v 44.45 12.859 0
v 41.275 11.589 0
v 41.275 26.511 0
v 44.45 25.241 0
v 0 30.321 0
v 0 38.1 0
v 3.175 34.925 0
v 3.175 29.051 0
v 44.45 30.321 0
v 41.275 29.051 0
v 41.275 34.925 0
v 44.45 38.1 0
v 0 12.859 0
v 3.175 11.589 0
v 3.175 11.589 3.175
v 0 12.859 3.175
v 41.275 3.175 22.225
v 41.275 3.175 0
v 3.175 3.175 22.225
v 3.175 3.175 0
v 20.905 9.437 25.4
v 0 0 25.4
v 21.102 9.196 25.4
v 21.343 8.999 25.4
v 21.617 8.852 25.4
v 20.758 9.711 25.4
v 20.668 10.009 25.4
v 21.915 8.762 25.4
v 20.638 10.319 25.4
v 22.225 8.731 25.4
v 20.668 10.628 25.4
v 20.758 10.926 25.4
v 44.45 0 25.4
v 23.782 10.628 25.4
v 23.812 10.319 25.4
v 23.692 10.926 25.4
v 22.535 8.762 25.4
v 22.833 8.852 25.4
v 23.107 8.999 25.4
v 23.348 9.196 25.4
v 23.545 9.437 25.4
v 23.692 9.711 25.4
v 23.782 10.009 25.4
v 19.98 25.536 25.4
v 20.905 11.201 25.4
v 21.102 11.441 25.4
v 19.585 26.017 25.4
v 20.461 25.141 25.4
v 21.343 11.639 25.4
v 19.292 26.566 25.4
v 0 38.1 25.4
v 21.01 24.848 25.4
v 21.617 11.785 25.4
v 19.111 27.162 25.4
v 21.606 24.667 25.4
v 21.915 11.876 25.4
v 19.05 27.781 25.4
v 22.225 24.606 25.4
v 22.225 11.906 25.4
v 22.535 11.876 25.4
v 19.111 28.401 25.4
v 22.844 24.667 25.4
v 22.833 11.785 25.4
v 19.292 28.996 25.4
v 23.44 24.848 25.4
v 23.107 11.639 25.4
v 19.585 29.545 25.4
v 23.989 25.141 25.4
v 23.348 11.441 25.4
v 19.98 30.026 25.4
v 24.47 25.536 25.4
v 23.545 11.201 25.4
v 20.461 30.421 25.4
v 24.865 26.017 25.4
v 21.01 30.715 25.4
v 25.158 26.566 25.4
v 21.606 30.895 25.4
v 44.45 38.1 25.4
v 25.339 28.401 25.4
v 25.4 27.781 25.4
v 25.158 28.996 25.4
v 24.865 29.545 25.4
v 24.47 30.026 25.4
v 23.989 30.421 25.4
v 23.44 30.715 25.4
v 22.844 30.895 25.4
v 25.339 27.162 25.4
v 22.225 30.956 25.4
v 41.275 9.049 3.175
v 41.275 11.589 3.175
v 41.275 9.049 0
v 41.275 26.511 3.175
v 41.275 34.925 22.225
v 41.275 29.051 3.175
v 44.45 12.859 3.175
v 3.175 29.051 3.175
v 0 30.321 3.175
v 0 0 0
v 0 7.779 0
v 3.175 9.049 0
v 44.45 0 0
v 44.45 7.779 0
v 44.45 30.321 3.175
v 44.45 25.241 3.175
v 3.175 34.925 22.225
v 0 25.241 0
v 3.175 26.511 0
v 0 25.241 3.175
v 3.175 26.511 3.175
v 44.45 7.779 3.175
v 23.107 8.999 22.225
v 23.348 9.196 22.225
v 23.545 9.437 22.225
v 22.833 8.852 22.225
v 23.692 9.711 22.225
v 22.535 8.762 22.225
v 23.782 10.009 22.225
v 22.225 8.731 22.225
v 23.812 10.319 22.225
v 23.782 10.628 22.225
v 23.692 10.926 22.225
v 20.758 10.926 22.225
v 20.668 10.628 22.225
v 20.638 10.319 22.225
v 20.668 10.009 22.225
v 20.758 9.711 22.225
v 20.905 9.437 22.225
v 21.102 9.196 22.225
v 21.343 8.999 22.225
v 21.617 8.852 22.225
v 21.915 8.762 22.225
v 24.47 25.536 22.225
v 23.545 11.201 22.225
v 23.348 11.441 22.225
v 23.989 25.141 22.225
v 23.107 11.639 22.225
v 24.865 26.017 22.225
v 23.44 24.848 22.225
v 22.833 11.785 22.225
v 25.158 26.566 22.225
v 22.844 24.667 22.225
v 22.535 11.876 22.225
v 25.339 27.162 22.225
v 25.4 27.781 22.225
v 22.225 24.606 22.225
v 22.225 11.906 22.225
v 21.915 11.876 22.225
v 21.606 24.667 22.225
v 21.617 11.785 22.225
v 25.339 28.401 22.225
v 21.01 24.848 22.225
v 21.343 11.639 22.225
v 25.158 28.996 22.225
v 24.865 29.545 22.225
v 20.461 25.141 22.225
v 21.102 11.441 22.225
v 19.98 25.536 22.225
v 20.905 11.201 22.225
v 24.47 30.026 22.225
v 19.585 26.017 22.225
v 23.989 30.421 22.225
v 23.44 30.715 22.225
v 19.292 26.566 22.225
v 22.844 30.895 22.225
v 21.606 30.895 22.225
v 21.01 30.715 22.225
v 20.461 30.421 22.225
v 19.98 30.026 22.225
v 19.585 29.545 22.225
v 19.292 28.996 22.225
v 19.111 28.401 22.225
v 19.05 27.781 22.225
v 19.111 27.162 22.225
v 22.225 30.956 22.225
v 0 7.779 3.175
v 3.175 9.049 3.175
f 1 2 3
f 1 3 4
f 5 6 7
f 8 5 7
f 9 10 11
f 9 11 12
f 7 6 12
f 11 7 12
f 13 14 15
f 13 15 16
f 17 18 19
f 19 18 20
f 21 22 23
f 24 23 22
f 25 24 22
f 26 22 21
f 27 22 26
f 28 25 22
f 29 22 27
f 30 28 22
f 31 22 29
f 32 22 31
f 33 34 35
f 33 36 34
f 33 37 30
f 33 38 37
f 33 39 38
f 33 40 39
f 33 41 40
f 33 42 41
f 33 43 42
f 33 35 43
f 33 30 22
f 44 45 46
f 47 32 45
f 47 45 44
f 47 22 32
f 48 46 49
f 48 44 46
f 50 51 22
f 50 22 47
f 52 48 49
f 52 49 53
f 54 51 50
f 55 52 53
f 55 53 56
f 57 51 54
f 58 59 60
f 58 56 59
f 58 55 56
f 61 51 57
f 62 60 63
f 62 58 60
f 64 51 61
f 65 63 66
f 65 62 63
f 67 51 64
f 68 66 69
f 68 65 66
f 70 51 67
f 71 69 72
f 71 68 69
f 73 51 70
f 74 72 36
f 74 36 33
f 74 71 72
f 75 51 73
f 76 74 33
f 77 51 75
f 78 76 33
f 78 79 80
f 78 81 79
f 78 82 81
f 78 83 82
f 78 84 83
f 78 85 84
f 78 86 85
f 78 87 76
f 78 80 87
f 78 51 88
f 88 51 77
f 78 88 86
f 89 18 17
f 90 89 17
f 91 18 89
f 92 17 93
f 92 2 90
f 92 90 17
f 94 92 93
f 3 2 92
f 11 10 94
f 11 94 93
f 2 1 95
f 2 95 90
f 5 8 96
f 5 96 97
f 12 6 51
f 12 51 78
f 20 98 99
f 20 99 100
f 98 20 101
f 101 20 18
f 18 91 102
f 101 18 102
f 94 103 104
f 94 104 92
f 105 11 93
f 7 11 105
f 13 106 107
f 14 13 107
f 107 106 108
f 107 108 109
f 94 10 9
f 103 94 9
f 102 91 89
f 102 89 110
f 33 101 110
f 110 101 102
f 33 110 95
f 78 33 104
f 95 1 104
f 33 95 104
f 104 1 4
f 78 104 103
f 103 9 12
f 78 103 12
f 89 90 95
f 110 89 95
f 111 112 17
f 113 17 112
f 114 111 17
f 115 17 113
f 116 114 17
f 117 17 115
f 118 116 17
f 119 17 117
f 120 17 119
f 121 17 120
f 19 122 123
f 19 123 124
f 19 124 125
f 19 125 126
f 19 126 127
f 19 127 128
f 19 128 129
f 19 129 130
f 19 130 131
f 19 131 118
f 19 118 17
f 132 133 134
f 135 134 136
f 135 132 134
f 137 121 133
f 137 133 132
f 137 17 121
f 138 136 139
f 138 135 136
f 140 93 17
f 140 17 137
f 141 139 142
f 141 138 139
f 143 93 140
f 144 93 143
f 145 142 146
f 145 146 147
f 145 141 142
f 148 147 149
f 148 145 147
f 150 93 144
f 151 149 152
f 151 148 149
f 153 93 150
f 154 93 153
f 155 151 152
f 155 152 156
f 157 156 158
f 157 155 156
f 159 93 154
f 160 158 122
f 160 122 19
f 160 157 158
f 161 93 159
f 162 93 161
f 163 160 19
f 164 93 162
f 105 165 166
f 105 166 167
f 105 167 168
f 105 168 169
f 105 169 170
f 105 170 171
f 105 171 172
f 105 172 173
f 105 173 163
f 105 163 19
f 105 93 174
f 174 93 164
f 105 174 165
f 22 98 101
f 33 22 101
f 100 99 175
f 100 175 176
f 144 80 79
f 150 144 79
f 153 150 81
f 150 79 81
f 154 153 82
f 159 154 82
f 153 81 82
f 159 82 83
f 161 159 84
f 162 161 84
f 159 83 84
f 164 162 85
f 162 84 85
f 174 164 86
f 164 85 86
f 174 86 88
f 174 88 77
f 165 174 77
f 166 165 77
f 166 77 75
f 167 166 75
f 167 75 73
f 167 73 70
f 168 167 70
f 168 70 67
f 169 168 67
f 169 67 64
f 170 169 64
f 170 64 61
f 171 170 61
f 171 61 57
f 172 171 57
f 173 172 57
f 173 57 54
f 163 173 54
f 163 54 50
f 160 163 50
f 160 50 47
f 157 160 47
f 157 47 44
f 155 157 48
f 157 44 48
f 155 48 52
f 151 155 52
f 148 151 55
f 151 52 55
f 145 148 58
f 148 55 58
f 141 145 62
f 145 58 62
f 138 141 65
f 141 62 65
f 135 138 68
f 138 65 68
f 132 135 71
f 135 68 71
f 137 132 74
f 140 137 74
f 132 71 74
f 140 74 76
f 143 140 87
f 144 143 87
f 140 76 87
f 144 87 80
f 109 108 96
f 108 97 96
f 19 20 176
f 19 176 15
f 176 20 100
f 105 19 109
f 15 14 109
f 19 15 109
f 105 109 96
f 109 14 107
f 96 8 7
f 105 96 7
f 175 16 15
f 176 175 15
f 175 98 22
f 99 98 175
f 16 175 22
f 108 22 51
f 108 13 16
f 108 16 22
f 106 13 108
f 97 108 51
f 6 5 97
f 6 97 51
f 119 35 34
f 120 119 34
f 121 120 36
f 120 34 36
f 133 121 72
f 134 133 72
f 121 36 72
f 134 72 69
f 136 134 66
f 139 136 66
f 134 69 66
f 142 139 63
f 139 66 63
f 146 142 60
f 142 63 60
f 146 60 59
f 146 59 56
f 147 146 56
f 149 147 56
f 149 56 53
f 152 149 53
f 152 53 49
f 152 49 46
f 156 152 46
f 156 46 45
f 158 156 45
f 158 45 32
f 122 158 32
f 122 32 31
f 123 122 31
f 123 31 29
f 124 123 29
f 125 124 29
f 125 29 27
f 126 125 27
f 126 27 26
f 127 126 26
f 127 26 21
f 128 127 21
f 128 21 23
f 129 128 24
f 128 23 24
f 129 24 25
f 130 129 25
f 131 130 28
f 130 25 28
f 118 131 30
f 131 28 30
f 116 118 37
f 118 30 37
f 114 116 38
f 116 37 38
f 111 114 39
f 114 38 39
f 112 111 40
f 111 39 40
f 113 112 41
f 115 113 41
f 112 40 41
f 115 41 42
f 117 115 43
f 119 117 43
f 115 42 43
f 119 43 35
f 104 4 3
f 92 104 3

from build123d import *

# Parameters (mm, degrees)
SKETCH1_W           = 44.45
SKETCH1_H           = 38.1
BOSS_EXTRUDE1_DEPTH = 25.4
SKETCH2_W           = 38.1
SKETCH2_H           = 31.75
CUT_EXTRUDE1_DEPTH  = 22.225
SKETCH3_R           = 3.175
SKETCH3_R_2         = 1.5875
CUT_EXTRUDE2_DEPTH  = 22.225
CUT_EXTRUDE3_DEPTH  = 3.175


with BuildPart() as part:
    # Sketch1 → Boss-Extrude1 (new body)
    with BuildSketch(Plane.XY):
        with Locations((22.225, 19.05)):
            Rectangle(SKETCH1_W, SKETCH1_H)
    extrude(amount=BOSS_EXTRUDE1_DEPTH)

    # Sketch2 → Cut-Extrude1 (cut)
    with BuildSketch(Plane(origin=(0, 0, 0), x_dir=(-1, 0, 0), z_dir=(0, 0, -1))):
        with Locations((-22.225, 19.05)):
            Rectangle(SKETCH2_W, SKETCH2_H)
    extrude(amount=-CUT_EXTRUDE1_DEPTH, mode=Mode.SUBTRACT)

    # Sketch3 → Cut-Extrude2 (cut)
    with BuildSketch(Plane.XY.offset(25.4)):
        with Locations((22.225, 27.78125)):
            Circle(SKETCH3_R)
        with Locations((22.225, 10.31875)):
            Circle(SKETCH3_R_2)
    extrude(amount=-CUT_EXTRUDE2_DEPTH, mode=Mode.SUBTRACT)

    # Sketch4 → Cut-Extrude3 (cut)
    with BuildSketch(Plane(origin=(0, 0, 0), x_dir=(-1, 0, 0), z_dir=(0, 0, -1))):
        Polygon((-41.275, 26.51125), (-41.275, 29.05125), (-44.45, 30.32125), (-44.45, 25.24125), align=None)
        Polygon((-44.45, 12.85875), (-41.275, 11.58875), (-41.275, 9.04875), (-44.45, 7.77875), align=None)
        Polygon((0, 25.24125), (-3.175, 26.51125), (-3.175, 29.05125), (0, 30.32125), align=None)
        Polygon((0, 12.85875), (0, 7.77875), (-3.175, 9.04875), (-3.175, 11.58875), align=None)
    extrude(amount=-CUT_EXTRUDE3_DEPTH, mode=Mode.SUBTRACT)


solid = part.part
